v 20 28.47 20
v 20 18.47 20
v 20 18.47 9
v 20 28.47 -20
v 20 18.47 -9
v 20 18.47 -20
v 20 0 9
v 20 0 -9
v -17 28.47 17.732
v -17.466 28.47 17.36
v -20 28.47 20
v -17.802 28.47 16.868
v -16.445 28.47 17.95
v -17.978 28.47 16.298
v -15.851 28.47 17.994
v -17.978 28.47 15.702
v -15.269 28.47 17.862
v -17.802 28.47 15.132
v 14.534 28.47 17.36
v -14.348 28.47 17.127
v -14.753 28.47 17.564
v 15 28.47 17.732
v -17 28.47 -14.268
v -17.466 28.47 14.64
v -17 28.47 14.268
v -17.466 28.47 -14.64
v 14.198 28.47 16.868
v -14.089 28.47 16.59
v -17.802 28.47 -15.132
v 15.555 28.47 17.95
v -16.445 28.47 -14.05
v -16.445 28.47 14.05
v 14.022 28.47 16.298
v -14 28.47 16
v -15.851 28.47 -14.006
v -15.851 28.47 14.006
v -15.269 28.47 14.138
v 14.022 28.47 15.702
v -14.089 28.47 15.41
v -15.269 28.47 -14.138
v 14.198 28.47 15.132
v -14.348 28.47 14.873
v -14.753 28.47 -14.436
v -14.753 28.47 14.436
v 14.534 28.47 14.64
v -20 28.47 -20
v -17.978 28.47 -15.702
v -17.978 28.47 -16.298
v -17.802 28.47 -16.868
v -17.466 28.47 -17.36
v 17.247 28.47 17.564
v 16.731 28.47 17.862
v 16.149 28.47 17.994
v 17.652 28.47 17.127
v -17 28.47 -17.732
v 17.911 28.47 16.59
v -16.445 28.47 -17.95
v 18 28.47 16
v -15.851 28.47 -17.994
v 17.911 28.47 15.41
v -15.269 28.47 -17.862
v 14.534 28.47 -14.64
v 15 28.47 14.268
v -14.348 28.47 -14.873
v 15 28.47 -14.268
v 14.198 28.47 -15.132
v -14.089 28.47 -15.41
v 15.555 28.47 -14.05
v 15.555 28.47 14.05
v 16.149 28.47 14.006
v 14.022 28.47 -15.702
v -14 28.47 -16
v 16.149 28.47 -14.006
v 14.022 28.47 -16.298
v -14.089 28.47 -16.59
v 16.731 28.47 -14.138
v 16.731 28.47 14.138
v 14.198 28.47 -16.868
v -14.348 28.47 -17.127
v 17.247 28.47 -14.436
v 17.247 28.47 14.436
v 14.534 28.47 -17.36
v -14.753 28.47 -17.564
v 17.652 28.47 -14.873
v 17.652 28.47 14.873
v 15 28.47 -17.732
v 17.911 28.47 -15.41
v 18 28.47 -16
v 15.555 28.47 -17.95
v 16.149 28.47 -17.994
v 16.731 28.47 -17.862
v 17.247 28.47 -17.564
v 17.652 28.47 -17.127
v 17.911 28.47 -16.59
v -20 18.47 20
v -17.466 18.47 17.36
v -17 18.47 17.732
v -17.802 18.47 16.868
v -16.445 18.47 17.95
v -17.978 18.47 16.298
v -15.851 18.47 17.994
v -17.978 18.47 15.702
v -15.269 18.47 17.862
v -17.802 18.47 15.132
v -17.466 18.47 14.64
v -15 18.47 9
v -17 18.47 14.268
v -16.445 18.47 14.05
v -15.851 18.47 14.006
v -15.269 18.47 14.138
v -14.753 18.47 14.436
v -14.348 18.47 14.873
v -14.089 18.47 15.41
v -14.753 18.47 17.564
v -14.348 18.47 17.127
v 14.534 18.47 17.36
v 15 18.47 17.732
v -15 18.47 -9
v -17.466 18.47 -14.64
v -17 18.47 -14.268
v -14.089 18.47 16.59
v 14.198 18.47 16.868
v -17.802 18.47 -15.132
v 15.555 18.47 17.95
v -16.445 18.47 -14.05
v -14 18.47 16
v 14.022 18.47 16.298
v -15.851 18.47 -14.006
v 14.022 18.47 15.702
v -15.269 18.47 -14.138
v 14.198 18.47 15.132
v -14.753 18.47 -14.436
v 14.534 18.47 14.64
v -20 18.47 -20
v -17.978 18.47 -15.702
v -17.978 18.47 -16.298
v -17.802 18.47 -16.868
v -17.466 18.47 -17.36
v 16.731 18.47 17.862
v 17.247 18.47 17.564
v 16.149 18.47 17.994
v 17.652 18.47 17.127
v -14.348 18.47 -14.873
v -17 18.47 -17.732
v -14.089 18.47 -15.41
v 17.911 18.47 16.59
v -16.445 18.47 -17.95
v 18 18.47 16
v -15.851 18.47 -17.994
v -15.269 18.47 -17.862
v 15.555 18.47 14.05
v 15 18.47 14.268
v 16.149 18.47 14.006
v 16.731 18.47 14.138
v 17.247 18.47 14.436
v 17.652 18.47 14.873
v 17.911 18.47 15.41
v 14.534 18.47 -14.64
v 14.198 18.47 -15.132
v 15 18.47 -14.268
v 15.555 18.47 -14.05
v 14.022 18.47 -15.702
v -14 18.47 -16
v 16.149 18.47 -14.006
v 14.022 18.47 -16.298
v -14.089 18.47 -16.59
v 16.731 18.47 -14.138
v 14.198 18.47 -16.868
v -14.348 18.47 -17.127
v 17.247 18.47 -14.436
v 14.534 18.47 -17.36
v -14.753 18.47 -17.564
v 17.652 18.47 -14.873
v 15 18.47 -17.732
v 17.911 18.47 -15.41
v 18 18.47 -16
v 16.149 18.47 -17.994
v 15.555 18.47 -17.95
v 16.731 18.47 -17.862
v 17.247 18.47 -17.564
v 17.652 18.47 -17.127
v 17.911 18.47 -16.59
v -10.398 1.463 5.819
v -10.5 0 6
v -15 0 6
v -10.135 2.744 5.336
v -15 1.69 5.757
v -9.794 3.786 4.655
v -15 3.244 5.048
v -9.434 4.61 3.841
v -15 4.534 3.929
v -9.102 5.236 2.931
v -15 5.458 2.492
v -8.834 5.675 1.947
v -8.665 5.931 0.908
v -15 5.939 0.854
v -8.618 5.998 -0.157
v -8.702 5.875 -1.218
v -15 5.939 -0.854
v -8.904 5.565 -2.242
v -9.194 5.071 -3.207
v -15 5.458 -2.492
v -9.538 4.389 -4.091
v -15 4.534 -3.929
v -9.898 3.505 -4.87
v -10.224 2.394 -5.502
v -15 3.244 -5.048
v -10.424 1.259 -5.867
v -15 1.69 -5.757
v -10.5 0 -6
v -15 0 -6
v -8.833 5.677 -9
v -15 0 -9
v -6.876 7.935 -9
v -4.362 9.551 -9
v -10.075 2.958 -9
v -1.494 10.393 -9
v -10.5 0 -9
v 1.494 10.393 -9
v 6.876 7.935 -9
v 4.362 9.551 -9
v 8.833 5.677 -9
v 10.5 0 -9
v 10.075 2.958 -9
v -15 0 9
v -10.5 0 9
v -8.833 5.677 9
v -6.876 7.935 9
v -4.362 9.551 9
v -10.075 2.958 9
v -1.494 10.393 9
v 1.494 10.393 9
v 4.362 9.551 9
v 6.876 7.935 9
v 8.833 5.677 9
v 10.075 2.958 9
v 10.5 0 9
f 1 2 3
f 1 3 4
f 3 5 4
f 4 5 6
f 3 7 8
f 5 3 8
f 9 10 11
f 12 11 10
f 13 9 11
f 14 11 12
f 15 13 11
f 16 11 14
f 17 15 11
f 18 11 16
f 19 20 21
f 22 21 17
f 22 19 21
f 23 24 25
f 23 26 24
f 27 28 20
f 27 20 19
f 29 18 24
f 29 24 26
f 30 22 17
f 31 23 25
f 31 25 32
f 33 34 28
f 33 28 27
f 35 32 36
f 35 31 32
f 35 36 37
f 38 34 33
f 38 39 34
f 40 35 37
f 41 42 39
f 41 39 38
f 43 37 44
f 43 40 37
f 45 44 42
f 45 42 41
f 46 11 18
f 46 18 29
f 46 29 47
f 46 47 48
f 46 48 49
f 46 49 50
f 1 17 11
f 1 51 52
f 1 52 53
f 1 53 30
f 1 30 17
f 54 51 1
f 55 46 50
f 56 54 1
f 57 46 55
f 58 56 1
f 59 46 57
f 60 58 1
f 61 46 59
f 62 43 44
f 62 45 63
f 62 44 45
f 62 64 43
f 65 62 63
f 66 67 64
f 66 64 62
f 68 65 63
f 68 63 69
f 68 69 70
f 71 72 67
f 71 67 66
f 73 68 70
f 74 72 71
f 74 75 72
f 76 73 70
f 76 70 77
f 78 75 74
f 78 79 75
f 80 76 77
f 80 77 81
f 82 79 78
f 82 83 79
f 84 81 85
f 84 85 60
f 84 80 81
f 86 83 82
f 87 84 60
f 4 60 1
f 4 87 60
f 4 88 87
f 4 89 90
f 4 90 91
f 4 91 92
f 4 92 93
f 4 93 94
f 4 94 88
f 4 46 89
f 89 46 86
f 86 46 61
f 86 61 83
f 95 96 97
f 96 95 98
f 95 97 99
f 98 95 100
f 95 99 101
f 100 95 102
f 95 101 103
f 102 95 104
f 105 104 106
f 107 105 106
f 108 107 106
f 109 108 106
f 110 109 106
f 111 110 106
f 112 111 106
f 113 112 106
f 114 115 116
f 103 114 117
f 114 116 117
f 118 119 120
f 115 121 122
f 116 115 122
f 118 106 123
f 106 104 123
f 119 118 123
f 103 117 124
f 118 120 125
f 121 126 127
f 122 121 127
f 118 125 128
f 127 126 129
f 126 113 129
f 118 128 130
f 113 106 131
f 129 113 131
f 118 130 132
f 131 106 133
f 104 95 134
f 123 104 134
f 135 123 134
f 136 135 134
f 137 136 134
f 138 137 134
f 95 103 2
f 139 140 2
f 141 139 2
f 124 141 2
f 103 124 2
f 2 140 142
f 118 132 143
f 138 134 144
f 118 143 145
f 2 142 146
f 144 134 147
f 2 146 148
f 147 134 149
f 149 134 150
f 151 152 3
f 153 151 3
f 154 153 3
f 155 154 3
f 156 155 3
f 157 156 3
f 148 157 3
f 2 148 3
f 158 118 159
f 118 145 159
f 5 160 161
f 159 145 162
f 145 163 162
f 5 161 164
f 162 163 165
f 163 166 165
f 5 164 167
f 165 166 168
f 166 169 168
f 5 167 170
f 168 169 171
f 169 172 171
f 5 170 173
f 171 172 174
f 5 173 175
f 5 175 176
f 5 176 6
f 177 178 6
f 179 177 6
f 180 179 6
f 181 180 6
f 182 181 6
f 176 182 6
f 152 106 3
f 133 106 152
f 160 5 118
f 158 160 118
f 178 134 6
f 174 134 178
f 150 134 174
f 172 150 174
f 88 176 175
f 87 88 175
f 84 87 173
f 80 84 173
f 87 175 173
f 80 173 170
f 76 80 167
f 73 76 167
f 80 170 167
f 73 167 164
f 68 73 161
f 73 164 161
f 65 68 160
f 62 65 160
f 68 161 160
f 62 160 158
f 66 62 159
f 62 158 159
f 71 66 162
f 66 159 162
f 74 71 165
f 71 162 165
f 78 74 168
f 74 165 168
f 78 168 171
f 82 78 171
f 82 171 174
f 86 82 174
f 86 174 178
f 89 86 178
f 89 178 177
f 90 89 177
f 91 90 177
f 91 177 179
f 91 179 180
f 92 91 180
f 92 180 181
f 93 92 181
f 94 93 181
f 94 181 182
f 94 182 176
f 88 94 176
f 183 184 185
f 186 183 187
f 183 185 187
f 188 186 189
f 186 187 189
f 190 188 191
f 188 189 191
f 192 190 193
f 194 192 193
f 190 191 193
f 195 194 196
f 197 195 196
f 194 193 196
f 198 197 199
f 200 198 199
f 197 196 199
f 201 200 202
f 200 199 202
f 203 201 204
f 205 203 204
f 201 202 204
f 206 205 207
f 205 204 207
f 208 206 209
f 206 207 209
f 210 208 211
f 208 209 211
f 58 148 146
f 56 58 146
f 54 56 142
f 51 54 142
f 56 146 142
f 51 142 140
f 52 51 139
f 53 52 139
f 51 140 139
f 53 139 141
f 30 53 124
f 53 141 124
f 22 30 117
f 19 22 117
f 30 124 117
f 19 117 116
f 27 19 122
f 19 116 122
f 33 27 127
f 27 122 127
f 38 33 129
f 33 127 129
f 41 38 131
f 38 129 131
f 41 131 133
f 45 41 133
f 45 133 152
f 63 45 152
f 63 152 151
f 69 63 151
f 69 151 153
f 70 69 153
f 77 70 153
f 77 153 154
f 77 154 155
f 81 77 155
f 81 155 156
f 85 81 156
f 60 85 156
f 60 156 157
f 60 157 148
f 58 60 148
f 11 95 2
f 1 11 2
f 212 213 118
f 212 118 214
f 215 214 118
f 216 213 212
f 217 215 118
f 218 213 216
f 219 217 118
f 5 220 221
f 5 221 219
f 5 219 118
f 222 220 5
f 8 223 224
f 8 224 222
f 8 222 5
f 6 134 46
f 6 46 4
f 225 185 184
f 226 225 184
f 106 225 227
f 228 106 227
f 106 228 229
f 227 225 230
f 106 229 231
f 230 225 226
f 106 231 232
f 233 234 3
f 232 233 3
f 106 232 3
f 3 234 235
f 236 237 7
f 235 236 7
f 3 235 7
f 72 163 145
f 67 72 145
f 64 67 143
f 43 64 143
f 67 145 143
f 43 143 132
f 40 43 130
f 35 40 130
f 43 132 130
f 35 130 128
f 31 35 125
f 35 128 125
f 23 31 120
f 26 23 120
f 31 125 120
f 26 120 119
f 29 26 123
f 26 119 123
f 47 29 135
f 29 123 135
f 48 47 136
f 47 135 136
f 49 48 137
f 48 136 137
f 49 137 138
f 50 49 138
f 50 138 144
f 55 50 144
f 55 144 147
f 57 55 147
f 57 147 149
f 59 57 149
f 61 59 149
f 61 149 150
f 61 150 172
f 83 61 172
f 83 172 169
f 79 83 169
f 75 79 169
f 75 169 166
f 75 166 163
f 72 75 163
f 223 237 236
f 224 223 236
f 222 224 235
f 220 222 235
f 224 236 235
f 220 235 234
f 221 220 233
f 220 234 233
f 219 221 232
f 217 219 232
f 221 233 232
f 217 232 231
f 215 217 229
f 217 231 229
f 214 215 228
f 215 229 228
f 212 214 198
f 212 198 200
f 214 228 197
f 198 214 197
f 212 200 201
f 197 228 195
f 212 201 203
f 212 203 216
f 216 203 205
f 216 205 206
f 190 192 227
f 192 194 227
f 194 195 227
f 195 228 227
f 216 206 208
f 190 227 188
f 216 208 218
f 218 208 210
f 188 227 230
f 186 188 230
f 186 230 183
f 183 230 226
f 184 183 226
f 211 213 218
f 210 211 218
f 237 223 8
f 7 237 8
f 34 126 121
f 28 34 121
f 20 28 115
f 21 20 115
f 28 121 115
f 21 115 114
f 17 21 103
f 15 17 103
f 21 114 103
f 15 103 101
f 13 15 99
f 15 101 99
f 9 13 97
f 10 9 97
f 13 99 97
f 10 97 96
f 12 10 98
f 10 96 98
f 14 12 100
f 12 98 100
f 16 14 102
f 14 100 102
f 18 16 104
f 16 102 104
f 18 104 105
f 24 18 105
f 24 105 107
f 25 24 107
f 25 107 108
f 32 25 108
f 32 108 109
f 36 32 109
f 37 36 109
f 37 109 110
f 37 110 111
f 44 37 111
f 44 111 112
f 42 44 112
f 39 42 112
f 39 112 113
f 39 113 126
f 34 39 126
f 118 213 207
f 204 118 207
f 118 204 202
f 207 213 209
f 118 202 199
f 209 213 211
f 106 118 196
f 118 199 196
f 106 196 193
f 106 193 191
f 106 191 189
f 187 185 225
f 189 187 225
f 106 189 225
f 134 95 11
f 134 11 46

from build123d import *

# Parameters (mm, degrees)
SKETCH1_W           = 40
SKETCH1_H           = 18
BOSS_EXTRUDE1_DEPTH = 18.47
CUT_EXTRUDE1_REACH  = 20
SKETCH2_R           = 10.5
CUT_EXTRUDE3_REACH  = 42
SKETCH4_R           = 6
CUT_EXTRUDE4_REACH  = 20.47
SKETCH5_W           = 5
SKETCH5_H           = 18
SKETCH6_W           = 40
SKETCH6_H           = 40
BOSS_EXTRUDE2_DEPTH = 10
CUT_EXTRUDE5_REACH  = 12
SKETCH7_R           = 2


with BuildPart() as part:
    # Sketch1 → Boss-Extrude1 (new body)
    with BuildSketch(Plane(origin=(0, 0, 0), x_dir=(1, 0, 0), z_dir=(0, 1, 0))):
        Rectangle(SKETCH1_W, SKETCH1_H)
    extrude(amount=BOSS_EXTRUDE1_DEPTH)

    # Sketch2 → Cut-Extrude1 (cut, up to next)
    with BuildSketch(Plane.XY.offset(9), mode=Mode.PRIVATE) as cut_extrude1_sk1:
        Circle(SKETCH2_R)
    cut_extrude1_tool1 = extrude(cut_extrude1_sk1.sketch, amount=-CUT_EXTRUDE1_REACH, mode=Mode.PRIVATE) & part.part
    add(cut_extrude1_tool1.solids().sort_by_distance((0, 0, 9))[0], mode=Mode.SUBTRACT)

    # Sketch4 → Cut-Extrude3 (cut, up to next)
    with BuildSketch(Plane.ZY.offset(20), mode=Mode.PRIVATE) as cut_extrude3_sk1:
        Circle(SKETCH4_R)
    cut_extrude3_tool1 = extrude(cut_extrude3_sk1.sketch, amount=-CUT_EXTRUDE3_REACH, mode=Mode.PRIVATE) & part.part
    add(cut_extrude3_tool1.solids().sort_by_distance((-20, 0, 0))[0], mode=Mode.SUBTRACT)

    # Sketch5 → Cut-Extrude4 (cut, up to next)
    with BuildSketch(Plane.XZ, mode=Mode.PRIVATE) as cut_extrude4_sk1:
        with Locations((-17.5, 0)):
            Rectangle(SKETCH5_W, SKETCH5_H)
    cut_extrude4_tool1 = extrude(cut_extrude4_sk1.sketch, amount=-CUT_EXTRUDE4_REACH, mode=Mode.PRIVATE) & part.part
    add(cut_extrude4_tool1.solids().sort_by_distance((-17.5, 0, 0))[0], mode=Mode.SUBTRACT)

    # Sketch6 → Boss-Extrude2 (add)
    with BuildSketch(Plane(origin=(0, 18.47, 0), x_dir=(1, 0, 0), z_dir=(0, 1, 0))):
        Rectangle(SKETCH6_W, SKETCH6_H)
    extrude(amount=BOSS_EXTRUDE2_DEPTH)

    # Sketch7 → Cut-Extrude5 (cut, up to next)
    with BuildSketch(Plane.XZ.offset(-18.47), mode=Mode.PRIVATE) as cut_extrude5_sk1:
        with Locations((16, 16)):
            Circle(SKETCH7_R)
    cut_extrude5_tool1 = extrude(cut_extrude5_sk1.sketch, amount=-CUT_EXTRUDE5_REACH, mode=Mode.PRIVATE) & part.part
    add(cut_extrude5_tool1.solids().sort_by_distance((16, 18.47, 16))[0], mode=Mode.SUBTRACT)
    # Sketch7 → Cut-Extrude5 (cut, up to next)
    with BuildSketch(Plane.XZ.offset(-18.47), mode=Mode.PRIVATE) as cut_extrude5_sk2:
        with Locations((-16, 16)):
            Circle(SKETCH7_R)
    cut_extrude5_tool2 = extrude(cut_extrude5_sk2.sketch, amount=-CUT_EXTRUDE5_REACH, mode=Mode.PRIVATE) & part.part
    add(cut_extrude5_tool2.solids().sort_by_distance((-16, 18.47, 16))[0], mode=Mode.SUBTRACT)
    # Sketch7 → Cut-Extrude5 (cut, up to next)
    with BuildSketch(Plane.XZ.offset(-18.47), mode=Mode.PRIVATE) as cut_extrude5_sk3:
        with Locations((16, -16)):
            Circle(SKETCH7_R)
    cut_extrude5_tool3 = extrude(cut_extrude5_sk3.sketch, amount=-CUT_EXTRUDE5_REACH, mode=Mode.PRIVATE) & part.part
    add(cut_extrude5_tool3.solids().sort_by_distance((16, 18.47, -16))[0], mode=Mode.SUBTRACT)
    # Sketch7 → Cut-Extrude5 (cut, up to next)
    with BuildSketch(Plane.XZ.offset(-18.47), mode=Mode.PRIVATE) as cut_extrude5_sk4:
        with Locations((-16, -16)):
            Circle(SKETCH7_R)
    cut_extrude5_tool4 = extrude(cut_extrude5_sk4.sketch, amount=-CUT_EXTRUDE5_REACH, mode=Mode.PRIVATE) & part.part
    add(cut_extrude5_tool4.solids().sort_by_distance((-16, 18.47, -16))[0], mode=Mode.SUBTRACT)


solid = part.part
